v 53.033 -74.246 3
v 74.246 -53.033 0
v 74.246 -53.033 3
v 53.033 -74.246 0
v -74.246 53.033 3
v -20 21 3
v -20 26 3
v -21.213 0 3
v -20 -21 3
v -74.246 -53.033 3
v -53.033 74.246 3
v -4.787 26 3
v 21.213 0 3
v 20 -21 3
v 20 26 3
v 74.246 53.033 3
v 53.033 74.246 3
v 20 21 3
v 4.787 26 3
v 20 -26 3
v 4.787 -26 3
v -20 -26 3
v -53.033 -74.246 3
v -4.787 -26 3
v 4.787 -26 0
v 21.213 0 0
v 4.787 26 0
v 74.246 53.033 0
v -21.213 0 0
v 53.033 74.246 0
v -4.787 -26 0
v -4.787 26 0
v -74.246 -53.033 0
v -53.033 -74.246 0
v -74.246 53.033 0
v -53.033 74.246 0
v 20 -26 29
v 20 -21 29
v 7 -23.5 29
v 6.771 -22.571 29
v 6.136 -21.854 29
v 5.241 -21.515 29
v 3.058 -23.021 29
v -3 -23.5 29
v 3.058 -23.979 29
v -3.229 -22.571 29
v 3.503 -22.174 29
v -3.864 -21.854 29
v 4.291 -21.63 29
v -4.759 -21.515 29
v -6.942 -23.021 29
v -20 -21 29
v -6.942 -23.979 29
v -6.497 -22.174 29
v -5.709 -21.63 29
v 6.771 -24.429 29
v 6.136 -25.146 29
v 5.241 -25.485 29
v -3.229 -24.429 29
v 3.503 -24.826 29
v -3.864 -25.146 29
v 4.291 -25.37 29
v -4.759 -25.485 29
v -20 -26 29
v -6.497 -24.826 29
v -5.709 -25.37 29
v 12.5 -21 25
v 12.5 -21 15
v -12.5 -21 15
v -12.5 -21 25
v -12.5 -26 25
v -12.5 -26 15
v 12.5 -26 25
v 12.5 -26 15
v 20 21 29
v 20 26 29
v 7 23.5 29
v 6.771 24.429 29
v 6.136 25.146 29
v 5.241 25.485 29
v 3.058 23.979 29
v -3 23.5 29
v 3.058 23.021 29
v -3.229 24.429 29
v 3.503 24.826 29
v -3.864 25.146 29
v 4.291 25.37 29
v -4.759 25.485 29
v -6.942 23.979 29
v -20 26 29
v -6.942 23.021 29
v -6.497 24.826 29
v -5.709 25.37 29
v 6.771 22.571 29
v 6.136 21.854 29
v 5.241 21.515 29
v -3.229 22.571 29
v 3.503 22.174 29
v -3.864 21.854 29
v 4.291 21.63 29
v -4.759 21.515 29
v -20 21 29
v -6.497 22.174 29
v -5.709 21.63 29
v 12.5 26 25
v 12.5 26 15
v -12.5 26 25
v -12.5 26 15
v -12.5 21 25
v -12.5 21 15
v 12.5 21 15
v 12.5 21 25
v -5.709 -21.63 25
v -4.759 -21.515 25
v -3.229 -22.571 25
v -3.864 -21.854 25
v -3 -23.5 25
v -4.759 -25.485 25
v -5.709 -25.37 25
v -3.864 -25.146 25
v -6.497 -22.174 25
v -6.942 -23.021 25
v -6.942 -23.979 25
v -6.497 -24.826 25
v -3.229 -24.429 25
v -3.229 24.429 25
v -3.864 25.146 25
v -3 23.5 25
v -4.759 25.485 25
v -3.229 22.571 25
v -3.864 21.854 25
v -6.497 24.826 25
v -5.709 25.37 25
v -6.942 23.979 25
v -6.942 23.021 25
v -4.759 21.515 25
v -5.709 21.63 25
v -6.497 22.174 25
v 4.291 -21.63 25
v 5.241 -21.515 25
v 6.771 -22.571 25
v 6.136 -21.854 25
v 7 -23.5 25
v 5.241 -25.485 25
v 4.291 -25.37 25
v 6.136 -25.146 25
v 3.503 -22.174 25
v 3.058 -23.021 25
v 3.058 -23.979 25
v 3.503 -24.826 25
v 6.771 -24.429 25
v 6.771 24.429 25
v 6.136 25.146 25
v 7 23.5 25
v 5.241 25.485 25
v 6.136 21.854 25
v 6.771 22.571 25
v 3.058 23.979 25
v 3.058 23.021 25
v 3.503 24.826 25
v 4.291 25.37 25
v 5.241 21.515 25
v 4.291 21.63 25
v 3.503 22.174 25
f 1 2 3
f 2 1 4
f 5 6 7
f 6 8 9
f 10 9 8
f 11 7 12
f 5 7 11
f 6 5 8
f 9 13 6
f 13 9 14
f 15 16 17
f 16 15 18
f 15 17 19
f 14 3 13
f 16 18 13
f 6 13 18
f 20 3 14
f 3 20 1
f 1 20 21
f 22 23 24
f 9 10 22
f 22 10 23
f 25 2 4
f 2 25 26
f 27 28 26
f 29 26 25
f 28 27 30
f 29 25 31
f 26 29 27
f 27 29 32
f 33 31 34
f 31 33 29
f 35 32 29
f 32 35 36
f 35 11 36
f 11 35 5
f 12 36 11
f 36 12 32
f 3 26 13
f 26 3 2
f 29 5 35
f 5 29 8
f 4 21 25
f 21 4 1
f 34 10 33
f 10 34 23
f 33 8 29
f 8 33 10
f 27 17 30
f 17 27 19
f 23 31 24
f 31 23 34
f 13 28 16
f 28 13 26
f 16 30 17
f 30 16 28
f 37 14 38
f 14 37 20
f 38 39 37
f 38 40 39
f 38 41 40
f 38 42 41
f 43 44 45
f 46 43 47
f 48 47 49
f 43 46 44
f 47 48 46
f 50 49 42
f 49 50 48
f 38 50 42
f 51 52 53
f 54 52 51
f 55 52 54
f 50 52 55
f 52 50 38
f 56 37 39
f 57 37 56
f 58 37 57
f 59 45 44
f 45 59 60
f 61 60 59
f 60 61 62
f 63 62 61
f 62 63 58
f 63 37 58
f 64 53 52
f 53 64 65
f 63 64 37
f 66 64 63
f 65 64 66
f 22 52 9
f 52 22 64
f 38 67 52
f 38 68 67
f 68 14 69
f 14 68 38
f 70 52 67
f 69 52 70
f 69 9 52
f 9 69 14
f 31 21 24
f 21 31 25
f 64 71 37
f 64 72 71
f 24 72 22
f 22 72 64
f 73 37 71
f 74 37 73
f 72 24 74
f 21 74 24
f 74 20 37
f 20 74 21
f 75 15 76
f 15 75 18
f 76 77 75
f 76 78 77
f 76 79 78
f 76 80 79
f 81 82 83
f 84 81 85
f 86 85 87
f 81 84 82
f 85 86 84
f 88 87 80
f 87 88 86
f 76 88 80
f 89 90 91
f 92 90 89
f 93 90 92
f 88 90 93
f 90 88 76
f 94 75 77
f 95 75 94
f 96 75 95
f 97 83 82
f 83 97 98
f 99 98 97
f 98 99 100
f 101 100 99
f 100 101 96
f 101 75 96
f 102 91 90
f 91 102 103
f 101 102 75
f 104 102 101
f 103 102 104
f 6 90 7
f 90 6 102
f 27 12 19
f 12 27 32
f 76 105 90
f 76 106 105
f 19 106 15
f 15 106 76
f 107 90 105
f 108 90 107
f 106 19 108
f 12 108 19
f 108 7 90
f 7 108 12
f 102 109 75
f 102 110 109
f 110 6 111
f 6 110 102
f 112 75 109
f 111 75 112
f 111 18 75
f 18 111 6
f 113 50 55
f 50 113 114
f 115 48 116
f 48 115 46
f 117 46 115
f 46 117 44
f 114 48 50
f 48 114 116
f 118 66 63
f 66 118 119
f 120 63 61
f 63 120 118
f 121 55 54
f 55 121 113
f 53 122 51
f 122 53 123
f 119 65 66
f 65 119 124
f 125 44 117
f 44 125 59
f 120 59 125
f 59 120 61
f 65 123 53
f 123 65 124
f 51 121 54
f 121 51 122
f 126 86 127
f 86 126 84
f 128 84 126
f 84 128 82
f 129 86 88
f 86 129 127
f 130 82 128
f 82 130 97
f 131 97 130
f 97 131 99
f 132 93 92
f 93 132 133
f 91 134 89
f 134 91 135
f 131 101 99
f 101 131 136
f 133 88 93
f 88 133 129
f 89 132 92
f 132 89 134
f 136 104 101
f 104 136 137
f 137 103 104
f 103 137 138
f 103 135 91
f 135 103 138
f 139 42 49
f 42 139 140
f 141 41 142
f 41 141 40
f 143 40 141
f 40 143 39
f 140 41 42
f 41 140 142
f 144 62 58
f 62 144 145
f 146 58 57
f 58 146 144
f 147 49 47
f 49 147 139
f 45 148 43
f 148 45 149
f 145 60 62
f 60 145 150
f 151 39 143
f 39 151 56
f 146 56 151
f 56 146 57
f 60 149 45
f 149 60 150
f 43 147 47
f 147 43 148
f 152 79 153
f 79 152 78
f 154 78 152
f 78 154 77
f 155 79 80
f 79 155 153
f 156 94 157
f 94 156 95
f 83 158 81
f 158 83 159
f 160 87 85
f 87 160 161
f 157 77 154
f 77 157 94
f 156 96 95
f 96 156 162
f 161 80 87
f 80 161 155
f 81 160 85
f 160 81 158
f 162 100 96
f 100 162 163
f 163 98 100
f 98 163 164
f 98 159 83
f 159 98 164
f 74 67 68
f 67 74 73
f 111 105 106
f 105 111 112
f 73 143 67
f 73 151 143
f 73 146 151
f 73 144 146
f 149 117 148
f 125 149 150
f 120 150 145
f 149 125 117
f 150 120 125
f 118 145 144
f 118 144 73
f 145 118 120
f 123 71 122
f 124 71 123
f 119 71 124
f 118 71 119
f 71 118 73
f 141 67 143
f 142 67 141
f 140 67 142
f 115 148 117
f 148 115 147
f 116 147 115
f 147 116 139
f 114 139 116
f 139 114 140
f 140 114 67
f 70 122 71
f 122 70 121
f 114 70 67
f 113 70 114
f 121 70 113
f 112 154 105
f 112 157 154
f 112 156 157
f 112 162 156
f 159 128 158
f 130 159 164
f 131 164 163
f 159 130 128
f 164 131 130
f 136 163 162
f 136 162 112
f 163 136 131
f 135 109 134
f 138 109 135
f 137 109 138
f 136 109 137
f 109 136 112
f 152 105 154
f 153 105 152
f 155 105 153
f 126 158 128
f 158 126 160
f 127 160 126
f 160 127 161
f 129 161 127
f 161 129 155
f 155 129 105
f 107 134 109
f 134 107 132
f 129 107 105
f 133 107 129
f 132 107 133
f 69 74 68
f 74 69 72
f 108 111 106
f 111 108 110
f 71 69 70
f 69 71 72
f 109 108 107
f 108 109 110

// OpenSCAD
// file: servoMountLock.scad
module servoMountLock()
{
  space=[0.5, 0.5, 0.5];
  difference()
  {
    translate([-14-5, -10-10, 0])
      cube([2*(14+5), 2*(10+10), 4.5]);
    // screw holes
    for(dx = [-1, +1])
      for(dy = [-1, +1])
        translate([dx*14, dy*10, -2])
          cylinder(r=(3+1)/2, $fs=1.5, h=4.5+4);
    translate([0, 0, 1])
    {
      // main rod mounting hole
      translate([-(7.5+space[0])/2, -(30+space[1])/2, 4.5-(2+space[2])])
        cube([7.5, 30, 2] + space);
      // center, thicker part
      translate([-(10+space[0])/2, -(10+space[1])/2, 4.5-(3.5+space[2])])
        cube([10, 10, 3.5] + space);
    }
    // servo's screw space
    translate([0, 0, -1])
      cylinder(r=(9+1)/2, h=6, $fs=1);
  }
}

for(i=[0:1])
  translate([0, i*45, 0])
    servoMountLock();
// file: servo.scad
use <servoMountLock.scad>

module servo()
{
  cube([40, 20, 36]);
  // mount shelf
  difference()
  {
    translate([-13/2, 0, 26])
      cube([53, 20, 3]);
    // holes
    #for(dx=[-1, +1])
      for(dy=[-1, +1])
        translate([53/2-13/2+dx*47/2, 20/2+dy*(6-1), 26-4])
          cylinder(r=4/2, $fs=1, h=10);
  }
  // rotor bottom
  translate([13/2+3.5, 20/2, 36])
  {
    cylinder(r=13/2, h=2);
    // rotor itself
    translate([0,0,2])
    {
      cylinder(r=9/2, h=2.5);
      // center part
      translate([-10/2, -10/2, 2.5])
      {
        cube([10, 10, 3.2]);
        // side bars
        translate([-10, (10-7.2)/2, 1.2])
          cube([30, 7.2, 2]);
      }
    }
  }
}

servo();

%translate([13/2+3.5, 20/2, 36+3.2-0.5])
  rotate([0, 0, 90])
    servoMountLock();
// main file
use <servo.scad>

module base()
{
  // main suport elements
  for(rot=[-45, +45])
    rotate([0, 0, rot])
      translate([-180/2, -30/2, 0])
        cube([180, 30, 3]);
  // side screw mounts
  difference()
  {
    for(dy=[-(20+1+3+2), 20+1])
      translate([-40/2, dy, 0])
        cube([40, 3+2, 3+26]);
    // screw-access cut-in
    translate([-25/2, -60/2, 3+26-4-10])
      cube([25, 60, 10]);
    // screw holes
    #for(dx=[-1, +1])
      for(dy=[-1, +1])
        translate([dx*5, dy*23.5, 22])
          cylinder(r=(3+1)/2, h=10, $fs=1);
  }
}

base();

%translate([20/2, -40/2, 3])
  rotate([0,0,90])
    servo();
